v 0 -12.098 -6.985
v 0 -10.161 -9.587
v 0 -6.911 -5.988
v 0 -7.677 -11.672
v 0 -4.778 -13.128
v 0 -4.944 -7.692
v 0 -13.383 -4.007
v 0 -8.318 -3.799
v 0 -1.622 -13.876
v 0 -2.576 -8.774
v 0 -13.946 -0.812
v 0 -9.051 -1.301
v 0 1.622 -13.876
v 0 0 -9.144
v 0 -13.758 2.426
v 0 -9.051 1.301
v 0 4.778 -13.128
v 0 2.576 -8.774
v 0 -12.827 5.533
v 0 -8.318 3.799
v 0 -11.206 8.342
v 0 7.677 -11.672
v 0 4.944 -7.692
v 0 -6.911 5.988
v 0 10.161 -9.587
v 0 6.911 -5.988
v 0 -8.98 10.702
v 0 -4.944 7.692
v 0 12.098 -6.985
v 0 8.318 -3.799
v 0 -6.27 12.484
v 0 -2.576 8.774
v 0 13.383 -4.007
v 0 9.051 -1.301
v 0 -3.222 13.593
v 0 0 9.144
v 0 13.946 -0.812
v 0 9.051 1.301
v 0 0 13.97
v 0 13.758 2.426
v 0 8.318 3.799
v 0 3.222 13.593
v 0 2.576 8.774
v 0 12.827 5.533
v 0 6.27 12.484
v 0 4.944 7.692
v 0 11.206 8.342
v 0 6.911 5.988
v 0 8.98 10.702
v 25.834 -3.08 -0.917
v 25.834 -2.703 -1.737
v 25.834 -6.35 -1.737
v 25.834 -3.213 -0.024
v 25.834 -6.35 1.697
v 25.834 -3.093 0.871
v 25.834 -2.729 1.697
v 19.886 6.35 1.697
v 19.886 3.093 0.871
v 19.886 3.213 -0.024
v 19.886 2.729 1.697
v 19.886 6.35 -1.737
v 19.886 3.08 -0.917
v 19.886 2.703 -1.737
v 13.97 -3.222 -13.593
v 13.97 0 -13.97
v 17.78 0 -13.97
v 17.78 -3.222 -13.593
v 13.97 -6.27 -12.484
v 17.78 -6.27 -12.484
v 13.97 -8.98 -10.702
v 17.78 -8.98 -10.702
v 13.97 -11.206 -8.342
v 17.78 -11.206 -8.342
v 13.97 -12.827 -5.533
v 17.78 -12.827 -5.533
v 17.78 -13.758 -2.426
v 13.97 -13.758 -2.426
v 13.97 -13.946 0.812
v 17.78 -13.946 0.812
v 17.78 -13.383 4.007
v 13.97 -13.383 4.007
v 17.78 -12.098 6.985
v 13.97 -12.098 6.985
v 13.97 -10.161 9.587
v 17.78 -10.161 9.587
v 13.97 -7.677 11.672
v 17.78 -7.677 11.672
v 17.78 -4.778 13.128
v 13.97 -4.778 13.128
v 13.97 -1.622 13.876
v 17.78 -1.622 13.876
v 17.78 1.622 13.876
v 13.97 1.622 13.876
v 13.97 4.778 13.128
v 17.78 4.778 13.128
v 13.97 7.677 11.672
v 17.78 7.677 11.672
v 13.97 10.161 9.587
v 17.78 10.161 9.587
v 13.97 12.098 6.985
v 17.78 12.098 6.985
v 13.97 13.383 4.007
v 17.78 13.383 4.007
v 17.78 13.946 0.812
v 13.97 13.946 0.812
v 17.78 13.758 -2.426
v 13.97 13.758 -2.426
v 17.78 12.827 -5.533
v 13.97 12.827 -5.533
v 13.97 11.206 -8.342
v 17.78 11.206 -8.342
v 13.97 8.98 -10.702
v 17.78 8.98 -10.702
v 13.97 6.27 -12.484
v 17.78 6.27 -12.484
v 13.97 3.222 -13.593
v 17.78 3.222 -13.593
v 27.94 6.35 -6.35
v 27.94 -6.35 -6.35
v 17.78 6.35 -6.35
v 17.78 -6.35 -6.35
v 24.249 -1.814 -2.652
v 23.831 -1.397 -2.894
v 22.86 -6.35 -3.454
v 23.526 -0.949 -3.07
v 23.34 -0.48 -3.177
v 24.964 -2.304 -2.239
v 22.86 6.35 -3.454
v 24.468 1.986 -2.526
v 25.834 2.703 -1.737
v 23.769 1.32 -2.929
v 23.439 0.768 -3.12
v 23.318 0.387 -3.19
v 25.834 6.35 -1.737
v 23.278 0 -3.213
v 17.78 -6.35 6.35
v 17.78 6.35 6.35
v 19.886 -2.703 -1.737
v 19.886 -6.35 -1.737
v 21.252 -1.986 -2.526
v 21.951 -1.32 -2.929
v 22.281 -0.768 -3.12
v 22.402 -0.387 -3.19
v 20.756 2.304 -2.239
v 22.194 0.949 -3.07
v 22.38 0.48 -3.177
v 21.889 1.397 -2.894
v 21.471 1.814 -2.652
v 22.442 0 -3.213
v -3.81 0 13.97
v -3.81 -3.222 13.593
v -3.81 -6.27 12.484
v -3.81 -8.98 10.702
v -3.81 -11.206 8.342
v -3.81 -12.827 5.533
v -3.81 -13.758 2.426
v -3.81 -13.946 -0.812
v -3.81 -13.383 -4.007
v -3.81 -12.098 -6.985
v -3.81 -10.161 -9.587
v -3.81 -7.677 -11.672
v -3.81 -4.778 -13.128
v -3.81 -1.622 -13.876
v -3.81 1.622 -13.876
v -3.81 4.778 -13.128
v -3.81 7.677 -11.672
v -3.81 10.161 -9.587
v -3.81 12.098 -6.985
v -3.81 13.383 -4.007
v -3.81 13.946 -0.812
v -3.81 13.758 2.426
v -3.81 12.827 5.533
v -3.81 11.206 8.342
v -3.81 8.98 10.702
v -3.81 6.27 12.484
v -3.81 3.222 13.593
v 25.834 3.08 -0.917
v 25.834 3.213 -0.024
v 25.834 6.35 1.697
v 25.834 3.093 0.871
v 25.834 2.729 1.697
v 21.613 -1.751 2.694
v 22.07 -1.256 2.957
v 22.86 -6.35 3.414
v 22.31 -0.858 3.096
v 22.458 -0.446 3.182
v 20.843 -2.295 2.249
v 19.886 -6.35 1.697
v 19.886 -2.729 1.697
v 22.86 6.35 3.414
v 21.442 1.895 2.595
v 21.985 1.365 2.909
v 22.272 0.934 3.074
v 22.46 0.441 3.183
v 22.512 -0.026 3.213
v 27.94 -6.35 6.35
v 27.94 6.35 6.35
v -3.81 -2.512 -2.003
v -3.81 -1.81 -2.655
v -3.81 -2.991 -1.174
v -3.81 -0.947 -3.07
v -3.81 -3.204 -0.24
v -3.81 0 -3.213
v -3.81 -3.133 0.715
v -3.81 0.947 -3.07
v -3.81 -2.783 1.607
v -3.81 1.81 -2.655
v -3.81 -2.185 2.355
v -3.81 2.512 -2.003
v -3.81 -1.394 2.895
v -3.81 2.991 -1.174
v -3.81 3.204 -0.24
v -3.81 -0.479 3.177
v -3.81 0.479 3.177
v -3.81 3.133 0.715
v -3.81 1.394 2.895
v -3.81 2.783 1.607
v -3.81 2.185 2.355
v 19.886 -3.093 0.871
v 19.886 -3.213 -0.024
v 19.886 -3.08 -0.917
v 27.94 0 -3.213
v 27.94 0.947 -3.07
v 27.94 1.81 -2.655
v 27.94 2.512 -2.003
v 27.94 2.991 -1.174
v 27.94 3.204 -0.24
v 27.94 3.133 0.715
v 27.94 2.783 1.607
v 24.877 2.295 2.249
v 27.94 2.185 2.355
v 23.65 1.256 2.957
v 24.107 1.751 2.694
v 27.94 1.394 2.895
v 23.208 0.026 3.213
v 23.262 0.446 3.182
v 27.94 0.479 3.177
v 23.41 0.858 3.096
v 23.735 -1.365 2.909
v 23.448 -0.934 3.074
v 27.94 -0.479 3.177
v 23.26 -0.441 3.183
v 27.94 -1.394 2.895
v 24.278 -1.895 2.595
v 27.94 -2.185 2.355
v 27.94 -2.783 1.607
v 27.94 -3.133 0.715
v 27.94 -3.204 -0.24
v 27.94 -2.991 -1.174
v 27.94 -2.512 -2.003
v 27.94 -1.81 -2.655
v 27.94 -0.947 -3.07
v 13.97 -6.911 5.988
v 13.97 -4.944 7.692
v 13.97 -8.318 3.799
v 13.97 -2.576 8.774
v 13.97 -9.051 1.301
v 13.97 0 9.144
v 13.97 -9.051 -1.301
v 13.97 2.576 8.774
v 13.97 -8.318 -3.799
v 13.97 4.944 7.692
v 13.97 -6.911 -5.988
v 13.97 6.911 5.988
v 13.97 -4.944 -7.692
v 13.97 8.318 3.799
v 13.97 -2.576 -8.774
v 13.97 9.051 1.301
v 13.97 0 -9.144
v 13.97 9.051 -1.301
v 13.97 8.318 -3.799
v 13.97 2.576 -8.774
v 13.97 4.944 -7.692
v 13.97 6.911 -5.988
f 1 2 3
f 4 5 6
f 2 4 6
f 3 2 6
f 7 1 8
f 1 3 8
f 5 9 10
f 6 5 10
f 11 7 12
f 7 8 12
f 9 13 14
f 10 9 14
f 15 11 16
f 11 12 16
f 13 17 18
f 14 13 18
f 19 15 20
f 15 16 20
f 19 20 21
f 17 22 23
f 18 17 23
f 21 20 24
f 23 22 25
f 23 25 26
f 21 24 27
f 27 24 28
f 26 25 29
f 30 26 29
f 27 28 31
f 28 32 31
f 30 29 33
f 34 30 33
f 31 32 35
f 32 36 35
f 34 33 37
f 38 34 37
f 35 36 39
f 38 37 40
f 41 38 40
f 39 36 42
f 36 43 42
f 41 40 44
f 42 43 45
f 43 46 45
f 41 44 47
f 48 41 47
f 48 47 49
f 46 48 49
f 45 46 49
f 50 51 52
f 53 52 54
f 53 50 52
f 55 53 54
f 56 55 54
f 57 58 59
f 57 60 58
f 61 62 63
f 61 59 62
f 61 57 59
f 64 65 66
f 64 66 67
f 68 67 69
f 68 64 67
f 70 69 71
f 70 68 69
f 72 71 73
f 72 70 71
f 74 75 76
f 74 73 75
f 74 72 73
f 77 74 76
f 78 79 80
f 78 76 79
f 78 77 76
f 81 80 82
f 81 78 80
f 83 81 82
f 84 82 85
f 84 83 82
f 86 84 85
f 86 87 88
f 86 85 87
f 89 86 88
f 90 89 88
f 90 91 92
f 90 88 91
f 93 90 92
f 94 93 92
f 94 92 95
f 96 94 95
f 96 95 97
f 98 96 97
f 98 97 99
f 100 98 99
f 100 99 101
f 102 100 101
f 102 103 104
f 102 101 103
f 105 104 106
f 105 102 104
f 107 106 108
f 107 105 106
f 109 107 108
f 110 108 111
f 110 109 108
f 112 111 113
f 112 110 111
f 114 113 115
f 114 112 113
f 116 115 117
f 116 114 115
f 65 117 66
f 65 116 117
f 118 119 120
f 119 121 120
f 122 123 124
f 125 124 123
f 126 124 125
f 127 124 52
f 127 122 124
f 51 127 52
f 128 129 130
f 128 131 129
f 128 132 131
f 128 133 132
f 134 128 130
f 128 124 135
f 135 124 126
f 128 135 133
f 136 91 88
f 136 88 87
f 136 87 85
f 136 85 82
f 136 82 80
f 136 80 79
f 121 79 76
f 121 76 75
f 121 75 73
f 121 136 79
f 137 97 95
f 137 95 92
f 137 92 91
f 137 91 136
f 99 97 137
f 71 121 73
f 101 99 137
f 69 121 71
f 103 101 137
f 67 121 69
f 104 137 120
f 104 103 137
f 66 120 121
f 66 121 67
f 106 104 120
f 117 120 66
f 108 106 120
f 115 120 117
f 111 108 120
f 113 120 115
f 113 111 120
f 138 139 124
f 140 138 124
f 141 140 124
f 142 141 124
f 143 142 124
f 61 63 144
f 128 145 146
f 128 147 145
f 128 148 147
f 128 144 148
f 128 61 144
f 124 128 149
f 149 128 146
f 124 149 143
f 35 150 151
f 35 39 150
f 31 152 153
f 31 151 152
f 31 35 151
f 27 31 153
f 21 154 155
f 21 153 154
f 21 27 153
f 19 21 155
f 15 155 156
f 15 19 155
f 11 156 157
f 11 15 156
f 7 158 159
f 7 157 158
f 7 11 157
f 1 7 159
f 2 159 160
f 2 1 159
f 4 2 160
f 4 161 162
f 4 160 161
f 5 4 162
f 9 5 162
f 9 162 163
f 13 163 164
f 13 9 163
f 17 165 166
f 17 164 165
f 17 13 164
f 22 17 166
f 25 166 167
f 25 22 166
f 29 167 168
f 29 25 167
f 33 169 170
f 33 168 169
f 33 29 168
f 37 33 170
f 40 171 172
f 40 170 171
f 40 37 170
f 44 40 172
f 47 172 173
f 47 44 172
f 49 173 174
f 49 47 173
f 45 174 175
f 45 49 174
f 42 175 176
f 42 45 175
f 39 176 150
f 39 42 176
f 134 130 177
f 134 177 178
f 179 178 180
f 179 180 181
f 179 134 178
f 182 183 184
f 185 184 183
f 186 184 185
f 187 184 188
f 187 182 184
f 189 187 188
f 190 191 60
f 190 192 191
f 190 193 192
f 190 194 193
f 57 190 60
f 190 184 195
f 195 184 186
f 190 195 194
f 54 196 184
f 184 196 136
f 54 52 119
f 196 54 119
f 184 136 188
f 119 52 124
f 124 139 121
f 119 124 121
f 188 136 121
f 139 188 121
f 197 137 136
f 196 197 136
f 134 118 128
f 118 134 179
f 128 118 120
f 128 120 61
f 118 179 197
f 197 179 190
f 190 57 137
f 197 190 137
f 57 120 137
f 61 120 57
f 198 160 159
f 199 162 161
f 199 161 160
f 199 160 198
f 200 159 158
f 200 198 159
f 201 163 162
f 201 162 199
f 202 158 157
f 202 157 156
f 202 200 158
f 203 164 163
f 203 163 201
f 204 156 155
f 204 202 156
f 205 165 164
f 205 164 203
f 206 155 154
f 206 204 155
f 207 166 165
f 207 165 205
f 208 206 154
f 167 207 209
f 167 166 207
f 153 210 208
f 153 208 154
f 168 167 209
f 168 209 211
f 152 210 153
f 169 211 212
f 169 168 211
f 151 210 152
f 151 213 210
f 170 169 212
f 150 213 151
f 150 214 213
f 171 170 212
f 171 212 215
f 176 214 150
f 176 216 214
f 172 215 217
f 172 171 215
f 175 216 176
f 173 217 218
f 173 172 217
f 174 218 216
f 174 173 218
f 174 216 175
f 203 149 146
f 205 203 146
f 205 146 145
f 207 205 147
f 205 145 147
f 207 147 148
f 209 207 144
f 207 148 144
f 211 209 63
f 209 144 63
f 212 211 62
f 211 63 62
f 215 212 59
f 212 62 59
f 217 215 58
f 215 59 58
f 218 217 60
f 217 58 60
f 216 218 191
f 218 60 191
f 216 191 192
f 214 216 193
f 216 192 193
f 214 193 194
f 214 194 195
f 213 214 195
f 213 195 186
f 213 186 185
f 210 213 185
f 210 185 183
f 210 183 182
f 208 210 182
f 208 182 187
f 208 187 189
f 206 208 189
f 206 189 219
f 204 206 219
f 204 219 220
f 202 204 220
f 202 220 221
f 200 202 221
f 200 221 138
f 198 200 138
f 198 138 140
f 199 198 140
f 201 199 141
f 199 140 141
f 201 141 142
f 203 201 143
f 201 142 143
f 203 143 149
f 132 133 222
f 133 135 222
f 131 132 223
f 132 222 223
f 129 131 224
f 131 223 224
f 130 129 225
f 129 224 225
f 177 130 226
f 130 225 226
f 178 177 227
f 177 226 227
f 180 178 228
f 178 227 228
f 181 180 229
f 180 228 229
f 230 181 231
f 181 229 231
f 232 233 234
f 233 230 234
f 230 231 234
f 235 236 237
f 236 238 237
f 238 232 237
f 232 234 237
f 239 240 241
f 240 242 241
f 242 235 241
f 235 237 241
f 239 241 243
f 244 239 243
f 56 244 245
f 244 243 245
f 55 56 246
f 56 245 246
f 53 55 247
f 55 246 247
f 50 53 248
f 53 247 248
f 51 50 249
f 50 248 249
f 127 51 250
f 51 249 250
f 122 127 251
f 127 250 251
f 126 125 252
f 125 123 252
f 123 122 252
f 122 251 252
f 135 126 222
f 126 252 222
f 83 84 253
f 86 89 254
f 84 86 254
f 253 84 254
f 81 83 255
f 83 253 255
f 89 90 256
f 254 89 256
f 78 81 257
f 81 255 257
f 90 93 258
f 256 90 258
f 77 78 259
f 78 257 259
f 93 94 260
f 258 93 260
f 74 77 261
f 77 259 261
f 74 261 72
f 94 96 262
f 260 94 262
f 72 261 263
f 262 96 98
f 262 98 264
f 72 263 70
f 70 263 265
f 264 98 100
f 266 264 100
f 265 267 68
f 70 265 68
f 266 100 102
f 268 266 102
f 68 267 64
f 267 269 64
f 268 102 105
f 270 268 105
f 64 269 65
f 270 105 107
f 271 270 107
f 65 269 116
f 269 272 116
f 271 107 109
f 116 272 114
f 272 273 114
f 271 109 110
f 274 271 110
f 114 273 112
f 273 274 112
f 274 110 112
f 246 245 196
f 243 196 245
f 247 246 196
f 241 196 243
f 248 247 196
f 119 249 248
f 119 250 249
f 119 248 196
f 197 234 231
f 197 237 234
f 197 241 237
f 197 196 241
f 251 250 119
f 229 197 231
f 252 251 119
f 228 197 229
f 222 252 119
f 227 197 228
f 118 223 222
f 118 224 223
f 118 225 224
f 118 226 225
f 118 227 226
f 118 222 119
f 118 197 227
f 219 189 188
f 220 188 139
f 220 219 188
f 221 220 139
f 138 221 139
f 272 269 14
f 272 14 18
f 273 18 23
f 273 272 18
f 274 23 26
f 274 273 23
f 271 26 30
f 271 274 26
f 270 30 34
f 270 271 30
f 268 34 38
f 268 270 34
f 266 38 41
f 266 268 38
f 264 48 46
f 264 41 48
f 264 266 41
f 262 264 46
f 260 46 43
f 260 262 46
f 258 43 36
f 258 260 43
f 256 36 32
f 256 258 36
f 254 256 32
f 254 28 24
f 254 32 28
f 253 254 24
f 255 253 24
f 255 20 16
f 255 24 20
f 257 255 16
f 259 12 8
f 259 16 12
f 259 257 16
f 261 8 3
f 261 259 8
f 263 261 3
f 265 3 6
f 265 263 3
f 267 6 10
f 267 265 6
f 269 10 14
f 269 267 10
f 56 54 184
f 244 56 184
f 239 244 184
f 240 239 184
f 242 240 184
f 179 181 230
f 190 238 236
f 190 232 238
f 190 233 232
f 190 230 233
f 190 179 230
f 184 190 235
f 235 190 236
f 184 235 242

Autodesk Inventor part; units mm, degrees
ref_plane "YZ Plane" through (0, 0, 0) normal (1, 0, 0) x (0, 1, 0)
ref_plane "XZ Plane" through (0, 0, 0) normal (0, 1, 0) x (-1, 0, 0)
ref_plane "XY Plane" through (0, 0, 0) normal (0, 0, 1) x (1, 0, 0)
sketch "Sketch1" plane through (0, 0, 0) normal (1, 0, 0) x (0, 1, 0)
  circle A0 centre (0, 0) radius 9.144
  line L0 (0, 0) -> (9.144, 0)
  line L1 (9.144, 0) -> (9.144, -9.144)
  line L2 (9.144, -9.144) -> (0, -9.144)
  line L3 (0, -9.144) -> (0, 0)
  line L4 (0, 0) -> (9.144, 0)
  line L5 (9.144, 0) -> (9.144, 9.144)
  line L6 (9.144, 9.144) -> (0, 9.144)
  line L7 (0, 9.144) -> (0, 0)
  dimension "d0" = 18.288
extrude "Extrusion1" add sketch "Sketch1" along normal blind 13.97
sketch "Sketch5" plane through (13.97, 0, 0) normal (1, 0, 0) x (0, 0, -1)
  line L0 (9.144, 0) -> (9.144, 9.144) projected
  circle A0 centre (0, 0) radius 9.144
  line L1 (9.144, 9.144) -> (-9.144, 9.144)
  line L2 (-9.144, 9.144) -> (-9.144, 0)
  line L3 (-9.144, 0) -> (9.144, 0)
  line L4 (9.144, 0) -> (9.144, 9.144)
  point P0 (0, 9.144)
extrude "Extrusion5" cut sketch "Sketch5" against normal blind 25.4 contours A0 L1 L0 | L2 L1 A0
sketch "Sketch6" plane through (13.97, 0, 0) normal (1, 0, 0) x (0, 0, -1)
  circle A0 centre (0, 0) radius 3.2131
  dimension "d12" = 6.4262
extrude "Extrusion6" cut sketch "Sketch6" against normal blind 25.4
sketch "Sketch7" plane through (0, 0, 0) normal (-1, 0, 0) x (0, 0, 1)
  point P0 (0, 0)
sketch "Sketch8" plane through (13.97, 0, 0) normal (1, 0, 0) x (0, 0, -1)
  circle A0 centre (0, 0) radius 13.97
  dimension "d15" = 27.94
extrude "Extrusion7" add sketch "Sketch8" along normal blind 3.81
sketch "Sketch9" plane through (0, 0, 0) normal (-1, 0, 0) x (0, 0, 1)
  circle A0 centre (0, 0) radius 13.97
extrude "Extrusion8" add sketch "Sketch9" along normal blind 3.81
sketch "Sketch10" plane through (17.78, 0, 0) normal (1, 0, 0) x (0, 0, -1)
  line L0 (6.35, 0) -> (6.35, 6.35)
  line L1 (6.35, 6.35) -> (0, 6.35)
  line L2 (6.35, 6.35) -> (-6.35, 6.35)
  line L3 (-6.35, 6.35) -> (-6.35, -6.35)
  line L4 (-6.35, -6.35) -> (6.35, -6.35)
  line L5 (6.35, -6.35) -> (6.35, 6.35)
  point P0 (0, 0)
  dimension "d20" = 6.35
  dimension "d21" = 6.35
  dimension "d22" = 12.7
  dimension "d23" = 12.7
extrude "Extrusion9" add sketch "Sketch10" along normal blind 10.16
sketch "Sketch11" plane through (17.78, 6.35, 6.35) normal (0, 1, 0) x (1, 0, 0)
  line L0 (0, 12.7) -> (10.16, 12.7) projected
  line L1 (0, -7.62) -> (0, 20.32) projected
  line L2 (5.08, 3.1902) -> (5.08, 2.9362)
  line L3 (5.08, 9.8043) -> (8.054, 8.0873)
  line L4 (8.054, 8.0873) -> (8.054, 4.6532)
  line L5 (8.054, 4.6532) -> (5.08, 2.9362)
  line L6 (5.08, 2.9362) -> (2.106, 4.6532)
  line L7 (2.106, 4.6532) -> (2.106, 8.0873)
  line L8 (2.106, 8.0873) -> (5.08, 9.8043)
  point P0 (-17.78, 6.35)
  point P1 (-17.78, 7.62)
  point P2 (15.24, 15.24)
extrude "Extrusion10" cut sketch "Sketch11" against normal blind 25.4
sketch "Sketch12" plane through (27.94, 0, 0) normal (1, 0, 0) x (0, 0, -1)
  circle A0 centre (0, 0) radius 3.2131
extrude "Extrusion11" cut sketch "Sketch12" against normal blind 50.8
properties part number "230307 Bottom Pulley Adjusted"
